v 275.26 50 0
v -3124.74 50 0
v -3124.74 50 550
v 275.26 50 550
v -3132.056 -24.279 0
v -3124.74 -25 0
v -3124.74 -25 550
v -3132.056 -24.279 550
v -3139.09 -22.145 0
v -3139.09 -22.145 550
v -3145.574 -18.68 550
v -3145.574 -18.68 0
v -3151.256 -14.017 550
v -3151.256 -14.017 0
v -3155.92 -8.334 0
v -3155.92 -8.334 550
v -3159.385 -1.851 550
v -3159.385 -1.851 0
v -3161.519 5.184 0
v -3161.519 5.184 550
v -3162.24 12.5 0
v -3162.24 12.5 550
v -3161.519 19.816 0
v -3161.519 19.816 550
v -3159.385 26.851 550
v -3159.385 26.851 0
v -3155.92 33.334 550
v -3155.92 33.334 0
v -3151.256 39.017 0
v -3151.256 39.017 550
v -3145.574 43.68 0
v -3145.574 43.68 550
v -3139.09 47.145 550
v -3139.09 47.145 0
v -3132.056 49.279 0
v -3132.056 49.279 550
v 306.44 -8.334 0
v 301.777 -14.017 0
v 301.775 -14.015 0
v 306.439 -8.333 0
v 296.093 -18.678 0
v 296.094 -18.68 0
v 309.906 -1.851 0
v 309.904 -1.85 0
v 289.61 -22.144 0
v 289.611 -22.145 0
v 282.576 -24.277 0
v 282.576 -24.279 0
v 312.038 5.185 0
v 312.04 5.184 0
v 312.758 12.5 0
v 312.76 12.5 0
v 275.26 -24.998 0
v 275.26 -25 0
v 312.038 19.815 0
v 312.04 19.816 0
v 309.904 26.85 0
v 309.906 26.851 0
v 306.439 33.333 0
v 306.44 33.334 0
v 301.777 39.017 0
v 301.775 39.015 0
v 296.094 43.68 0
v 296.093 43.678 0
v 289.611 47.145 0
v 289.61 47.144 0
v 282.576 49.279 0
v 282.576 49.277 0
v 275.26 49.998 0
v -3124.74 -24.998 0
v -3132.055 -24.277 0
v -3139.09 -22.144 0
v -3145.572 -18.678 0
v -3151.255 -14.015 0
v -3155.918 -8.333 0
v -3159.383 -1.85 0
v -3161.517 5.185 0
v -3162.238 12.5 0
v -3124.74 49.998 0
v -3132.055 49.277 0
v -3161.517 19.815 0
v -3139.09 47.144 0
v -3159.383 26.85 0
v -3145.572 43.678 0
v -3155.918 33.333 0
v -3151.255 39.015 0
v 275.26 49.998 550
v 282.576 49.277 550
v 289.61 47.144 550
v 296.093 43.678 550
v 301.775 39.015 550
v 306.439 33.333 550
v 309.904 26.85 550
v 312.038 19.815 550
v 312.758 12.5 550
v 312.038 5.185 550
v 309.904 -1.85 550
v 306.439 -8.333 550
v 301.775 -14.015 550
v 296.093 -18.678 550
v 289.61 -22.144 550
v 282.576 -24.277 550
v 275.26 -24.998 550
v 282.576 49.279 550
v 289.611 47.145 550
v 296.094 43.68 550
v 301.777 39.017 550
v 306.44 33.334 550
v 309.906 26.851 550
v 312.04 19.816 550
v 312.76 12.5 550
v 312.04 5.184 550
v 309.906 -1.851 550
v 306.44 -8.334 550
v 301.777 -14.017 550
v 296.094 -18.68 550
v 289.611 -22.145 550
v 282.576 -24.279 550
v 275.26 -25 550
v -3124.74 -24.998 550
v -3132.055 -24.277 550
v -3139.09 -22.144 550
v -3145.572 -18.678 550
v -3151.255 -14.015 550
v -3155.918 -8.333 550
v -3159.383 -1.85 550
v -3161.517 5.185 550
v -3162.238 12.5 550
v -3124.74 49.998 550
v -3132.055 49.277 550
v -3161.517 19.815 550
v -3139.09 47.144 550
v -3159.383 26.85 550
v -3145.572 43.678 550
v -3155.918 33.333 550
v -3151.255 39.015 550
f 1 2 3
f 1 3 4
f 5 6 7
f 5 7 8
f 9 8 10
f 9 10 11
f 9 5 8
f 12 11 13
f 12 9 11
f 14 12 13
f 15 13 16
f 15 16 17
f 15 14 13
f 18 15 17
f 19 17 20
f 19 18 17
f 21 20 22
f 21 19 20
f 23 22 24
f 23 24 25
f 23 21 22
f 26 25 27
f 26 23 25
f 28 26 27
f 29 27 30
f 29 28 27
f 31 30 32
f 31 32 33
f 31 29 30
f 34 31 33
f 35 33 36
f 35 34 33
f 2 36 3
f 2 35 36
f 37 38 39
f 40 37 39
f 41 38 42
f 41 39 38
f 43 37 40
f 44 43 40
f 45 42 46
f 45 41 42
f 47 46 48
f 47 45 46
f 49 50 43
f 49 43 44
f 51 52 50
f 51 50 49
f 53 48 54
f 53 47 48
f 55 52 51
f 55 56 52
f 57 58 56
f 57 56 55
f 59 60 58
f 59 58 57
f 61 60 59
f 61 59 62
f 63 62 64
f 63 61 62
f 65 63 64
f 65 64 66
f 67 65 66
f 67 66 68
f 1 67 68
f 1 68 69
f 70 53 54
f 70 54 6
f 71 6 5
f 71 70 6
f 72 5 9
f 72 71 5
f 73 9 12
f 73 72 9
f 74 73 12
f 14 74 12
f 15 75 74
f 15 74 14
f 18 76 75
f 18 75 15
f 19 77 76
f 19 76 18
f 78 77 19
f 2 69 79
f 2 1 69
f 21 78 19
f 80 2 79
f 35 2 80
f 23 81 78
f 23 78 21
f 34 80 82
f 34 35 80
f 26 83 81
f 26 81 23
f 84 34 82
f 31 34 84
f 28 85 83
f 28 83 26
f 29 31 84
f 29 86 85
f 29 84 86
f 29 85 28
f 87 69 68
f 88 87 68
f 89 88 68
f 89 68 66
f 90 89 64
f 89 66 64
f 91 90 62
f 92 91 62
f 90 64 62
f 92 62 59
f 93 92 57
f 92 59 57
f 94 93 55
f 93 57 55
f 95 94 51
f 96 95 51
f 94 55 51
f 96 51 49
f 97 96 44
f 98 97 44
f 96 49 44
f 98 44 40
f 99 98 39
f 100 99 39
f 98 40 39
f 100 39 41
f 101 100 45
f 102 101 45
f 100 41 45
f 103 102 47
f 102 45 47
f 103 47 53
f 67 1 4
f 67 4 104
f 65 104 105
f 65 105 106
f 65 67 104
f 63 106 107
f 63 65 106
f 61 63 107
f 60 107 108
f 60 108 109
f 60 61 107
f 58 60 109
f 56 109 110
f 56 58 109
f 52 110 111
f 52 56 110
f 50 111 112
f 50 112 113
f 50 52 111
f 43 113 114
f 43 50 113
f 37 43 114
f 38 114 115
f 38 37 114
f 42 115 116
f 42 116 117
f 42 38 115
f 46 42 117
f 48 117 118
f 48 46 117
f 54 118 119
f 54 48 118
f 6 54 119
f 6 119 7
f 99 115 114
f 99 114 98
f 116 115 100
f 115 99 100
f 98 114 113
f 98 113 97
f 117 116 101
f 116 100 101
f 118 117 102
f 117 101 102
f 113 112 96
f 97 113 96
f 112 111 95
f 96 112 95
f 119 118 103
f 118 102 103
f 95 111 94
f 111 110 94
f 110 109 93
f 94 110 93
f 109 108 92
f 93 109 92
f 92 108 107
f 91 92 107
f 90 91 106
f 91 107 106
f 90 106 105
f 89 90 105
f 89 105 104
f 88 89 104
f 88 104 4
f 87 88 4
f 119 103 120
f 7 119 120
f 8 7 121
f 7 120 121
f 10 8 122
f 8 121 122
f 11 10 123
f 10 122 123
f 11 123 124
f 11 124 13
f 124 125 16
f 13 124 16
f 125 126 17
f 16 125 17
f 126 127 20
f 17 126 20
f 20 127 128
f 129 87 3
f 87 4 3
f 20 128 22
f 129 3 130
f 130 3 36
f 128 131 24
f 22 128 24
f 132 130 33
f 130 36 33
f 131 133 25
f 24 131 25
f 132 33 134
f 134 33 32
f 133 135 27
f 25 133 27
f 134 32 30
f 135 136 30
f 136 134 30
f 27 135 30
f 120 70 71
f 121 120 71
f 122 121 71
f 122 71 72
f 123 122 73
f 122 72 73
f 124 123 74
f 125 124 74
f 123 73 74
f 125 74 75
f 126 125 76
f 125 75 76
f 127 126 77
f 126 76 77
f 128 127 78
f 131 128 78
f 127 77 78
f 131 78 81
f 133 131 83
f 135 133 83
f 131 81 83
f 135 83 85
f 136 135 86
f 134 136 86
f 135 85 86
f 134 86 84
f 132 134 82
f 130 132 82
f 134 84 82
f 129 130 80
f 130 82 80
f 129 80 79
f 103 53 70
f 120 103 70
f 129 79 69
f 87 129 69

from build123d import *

# Parameters (mm, degrees)
BOSS_EXTRUDE1_DEPTH = 550
SHELL1_T            = -0.002


with BuildPart() as part:
    # Sketch1 → Boss-Extrude1 (new body)
    with BuildSketch(Plane.XY):
        with BuildLine():
            Line((-3124.739682402, 50), (275.260317598, 50))
            ThreePointArc((275.260317598, 50), (312.760317598, 12.5), (275.260317598, -25))
            Line((275.260317598, -25), (-3124.739682402, -25))
            ThreePointArc((-3124.739682402, -25), (-3162.239682402, 12.5), (-3124.739682402, 50))
        make_face()
    extrude(amount=BOSS_EXTRUDE1_DEPTH)

    # Shell1
    shell1_openings = [part.faces().sort_by_distance(p)[0] for p in [
        (-1424.739682402, 12.5, 550),
        (-1424.739682402, 12.5, 0),
    ]]
    offset(amount=SHELL1_T, openings=shell1_openings, kind=Kind.INTERSECTION)


solid = part.part
